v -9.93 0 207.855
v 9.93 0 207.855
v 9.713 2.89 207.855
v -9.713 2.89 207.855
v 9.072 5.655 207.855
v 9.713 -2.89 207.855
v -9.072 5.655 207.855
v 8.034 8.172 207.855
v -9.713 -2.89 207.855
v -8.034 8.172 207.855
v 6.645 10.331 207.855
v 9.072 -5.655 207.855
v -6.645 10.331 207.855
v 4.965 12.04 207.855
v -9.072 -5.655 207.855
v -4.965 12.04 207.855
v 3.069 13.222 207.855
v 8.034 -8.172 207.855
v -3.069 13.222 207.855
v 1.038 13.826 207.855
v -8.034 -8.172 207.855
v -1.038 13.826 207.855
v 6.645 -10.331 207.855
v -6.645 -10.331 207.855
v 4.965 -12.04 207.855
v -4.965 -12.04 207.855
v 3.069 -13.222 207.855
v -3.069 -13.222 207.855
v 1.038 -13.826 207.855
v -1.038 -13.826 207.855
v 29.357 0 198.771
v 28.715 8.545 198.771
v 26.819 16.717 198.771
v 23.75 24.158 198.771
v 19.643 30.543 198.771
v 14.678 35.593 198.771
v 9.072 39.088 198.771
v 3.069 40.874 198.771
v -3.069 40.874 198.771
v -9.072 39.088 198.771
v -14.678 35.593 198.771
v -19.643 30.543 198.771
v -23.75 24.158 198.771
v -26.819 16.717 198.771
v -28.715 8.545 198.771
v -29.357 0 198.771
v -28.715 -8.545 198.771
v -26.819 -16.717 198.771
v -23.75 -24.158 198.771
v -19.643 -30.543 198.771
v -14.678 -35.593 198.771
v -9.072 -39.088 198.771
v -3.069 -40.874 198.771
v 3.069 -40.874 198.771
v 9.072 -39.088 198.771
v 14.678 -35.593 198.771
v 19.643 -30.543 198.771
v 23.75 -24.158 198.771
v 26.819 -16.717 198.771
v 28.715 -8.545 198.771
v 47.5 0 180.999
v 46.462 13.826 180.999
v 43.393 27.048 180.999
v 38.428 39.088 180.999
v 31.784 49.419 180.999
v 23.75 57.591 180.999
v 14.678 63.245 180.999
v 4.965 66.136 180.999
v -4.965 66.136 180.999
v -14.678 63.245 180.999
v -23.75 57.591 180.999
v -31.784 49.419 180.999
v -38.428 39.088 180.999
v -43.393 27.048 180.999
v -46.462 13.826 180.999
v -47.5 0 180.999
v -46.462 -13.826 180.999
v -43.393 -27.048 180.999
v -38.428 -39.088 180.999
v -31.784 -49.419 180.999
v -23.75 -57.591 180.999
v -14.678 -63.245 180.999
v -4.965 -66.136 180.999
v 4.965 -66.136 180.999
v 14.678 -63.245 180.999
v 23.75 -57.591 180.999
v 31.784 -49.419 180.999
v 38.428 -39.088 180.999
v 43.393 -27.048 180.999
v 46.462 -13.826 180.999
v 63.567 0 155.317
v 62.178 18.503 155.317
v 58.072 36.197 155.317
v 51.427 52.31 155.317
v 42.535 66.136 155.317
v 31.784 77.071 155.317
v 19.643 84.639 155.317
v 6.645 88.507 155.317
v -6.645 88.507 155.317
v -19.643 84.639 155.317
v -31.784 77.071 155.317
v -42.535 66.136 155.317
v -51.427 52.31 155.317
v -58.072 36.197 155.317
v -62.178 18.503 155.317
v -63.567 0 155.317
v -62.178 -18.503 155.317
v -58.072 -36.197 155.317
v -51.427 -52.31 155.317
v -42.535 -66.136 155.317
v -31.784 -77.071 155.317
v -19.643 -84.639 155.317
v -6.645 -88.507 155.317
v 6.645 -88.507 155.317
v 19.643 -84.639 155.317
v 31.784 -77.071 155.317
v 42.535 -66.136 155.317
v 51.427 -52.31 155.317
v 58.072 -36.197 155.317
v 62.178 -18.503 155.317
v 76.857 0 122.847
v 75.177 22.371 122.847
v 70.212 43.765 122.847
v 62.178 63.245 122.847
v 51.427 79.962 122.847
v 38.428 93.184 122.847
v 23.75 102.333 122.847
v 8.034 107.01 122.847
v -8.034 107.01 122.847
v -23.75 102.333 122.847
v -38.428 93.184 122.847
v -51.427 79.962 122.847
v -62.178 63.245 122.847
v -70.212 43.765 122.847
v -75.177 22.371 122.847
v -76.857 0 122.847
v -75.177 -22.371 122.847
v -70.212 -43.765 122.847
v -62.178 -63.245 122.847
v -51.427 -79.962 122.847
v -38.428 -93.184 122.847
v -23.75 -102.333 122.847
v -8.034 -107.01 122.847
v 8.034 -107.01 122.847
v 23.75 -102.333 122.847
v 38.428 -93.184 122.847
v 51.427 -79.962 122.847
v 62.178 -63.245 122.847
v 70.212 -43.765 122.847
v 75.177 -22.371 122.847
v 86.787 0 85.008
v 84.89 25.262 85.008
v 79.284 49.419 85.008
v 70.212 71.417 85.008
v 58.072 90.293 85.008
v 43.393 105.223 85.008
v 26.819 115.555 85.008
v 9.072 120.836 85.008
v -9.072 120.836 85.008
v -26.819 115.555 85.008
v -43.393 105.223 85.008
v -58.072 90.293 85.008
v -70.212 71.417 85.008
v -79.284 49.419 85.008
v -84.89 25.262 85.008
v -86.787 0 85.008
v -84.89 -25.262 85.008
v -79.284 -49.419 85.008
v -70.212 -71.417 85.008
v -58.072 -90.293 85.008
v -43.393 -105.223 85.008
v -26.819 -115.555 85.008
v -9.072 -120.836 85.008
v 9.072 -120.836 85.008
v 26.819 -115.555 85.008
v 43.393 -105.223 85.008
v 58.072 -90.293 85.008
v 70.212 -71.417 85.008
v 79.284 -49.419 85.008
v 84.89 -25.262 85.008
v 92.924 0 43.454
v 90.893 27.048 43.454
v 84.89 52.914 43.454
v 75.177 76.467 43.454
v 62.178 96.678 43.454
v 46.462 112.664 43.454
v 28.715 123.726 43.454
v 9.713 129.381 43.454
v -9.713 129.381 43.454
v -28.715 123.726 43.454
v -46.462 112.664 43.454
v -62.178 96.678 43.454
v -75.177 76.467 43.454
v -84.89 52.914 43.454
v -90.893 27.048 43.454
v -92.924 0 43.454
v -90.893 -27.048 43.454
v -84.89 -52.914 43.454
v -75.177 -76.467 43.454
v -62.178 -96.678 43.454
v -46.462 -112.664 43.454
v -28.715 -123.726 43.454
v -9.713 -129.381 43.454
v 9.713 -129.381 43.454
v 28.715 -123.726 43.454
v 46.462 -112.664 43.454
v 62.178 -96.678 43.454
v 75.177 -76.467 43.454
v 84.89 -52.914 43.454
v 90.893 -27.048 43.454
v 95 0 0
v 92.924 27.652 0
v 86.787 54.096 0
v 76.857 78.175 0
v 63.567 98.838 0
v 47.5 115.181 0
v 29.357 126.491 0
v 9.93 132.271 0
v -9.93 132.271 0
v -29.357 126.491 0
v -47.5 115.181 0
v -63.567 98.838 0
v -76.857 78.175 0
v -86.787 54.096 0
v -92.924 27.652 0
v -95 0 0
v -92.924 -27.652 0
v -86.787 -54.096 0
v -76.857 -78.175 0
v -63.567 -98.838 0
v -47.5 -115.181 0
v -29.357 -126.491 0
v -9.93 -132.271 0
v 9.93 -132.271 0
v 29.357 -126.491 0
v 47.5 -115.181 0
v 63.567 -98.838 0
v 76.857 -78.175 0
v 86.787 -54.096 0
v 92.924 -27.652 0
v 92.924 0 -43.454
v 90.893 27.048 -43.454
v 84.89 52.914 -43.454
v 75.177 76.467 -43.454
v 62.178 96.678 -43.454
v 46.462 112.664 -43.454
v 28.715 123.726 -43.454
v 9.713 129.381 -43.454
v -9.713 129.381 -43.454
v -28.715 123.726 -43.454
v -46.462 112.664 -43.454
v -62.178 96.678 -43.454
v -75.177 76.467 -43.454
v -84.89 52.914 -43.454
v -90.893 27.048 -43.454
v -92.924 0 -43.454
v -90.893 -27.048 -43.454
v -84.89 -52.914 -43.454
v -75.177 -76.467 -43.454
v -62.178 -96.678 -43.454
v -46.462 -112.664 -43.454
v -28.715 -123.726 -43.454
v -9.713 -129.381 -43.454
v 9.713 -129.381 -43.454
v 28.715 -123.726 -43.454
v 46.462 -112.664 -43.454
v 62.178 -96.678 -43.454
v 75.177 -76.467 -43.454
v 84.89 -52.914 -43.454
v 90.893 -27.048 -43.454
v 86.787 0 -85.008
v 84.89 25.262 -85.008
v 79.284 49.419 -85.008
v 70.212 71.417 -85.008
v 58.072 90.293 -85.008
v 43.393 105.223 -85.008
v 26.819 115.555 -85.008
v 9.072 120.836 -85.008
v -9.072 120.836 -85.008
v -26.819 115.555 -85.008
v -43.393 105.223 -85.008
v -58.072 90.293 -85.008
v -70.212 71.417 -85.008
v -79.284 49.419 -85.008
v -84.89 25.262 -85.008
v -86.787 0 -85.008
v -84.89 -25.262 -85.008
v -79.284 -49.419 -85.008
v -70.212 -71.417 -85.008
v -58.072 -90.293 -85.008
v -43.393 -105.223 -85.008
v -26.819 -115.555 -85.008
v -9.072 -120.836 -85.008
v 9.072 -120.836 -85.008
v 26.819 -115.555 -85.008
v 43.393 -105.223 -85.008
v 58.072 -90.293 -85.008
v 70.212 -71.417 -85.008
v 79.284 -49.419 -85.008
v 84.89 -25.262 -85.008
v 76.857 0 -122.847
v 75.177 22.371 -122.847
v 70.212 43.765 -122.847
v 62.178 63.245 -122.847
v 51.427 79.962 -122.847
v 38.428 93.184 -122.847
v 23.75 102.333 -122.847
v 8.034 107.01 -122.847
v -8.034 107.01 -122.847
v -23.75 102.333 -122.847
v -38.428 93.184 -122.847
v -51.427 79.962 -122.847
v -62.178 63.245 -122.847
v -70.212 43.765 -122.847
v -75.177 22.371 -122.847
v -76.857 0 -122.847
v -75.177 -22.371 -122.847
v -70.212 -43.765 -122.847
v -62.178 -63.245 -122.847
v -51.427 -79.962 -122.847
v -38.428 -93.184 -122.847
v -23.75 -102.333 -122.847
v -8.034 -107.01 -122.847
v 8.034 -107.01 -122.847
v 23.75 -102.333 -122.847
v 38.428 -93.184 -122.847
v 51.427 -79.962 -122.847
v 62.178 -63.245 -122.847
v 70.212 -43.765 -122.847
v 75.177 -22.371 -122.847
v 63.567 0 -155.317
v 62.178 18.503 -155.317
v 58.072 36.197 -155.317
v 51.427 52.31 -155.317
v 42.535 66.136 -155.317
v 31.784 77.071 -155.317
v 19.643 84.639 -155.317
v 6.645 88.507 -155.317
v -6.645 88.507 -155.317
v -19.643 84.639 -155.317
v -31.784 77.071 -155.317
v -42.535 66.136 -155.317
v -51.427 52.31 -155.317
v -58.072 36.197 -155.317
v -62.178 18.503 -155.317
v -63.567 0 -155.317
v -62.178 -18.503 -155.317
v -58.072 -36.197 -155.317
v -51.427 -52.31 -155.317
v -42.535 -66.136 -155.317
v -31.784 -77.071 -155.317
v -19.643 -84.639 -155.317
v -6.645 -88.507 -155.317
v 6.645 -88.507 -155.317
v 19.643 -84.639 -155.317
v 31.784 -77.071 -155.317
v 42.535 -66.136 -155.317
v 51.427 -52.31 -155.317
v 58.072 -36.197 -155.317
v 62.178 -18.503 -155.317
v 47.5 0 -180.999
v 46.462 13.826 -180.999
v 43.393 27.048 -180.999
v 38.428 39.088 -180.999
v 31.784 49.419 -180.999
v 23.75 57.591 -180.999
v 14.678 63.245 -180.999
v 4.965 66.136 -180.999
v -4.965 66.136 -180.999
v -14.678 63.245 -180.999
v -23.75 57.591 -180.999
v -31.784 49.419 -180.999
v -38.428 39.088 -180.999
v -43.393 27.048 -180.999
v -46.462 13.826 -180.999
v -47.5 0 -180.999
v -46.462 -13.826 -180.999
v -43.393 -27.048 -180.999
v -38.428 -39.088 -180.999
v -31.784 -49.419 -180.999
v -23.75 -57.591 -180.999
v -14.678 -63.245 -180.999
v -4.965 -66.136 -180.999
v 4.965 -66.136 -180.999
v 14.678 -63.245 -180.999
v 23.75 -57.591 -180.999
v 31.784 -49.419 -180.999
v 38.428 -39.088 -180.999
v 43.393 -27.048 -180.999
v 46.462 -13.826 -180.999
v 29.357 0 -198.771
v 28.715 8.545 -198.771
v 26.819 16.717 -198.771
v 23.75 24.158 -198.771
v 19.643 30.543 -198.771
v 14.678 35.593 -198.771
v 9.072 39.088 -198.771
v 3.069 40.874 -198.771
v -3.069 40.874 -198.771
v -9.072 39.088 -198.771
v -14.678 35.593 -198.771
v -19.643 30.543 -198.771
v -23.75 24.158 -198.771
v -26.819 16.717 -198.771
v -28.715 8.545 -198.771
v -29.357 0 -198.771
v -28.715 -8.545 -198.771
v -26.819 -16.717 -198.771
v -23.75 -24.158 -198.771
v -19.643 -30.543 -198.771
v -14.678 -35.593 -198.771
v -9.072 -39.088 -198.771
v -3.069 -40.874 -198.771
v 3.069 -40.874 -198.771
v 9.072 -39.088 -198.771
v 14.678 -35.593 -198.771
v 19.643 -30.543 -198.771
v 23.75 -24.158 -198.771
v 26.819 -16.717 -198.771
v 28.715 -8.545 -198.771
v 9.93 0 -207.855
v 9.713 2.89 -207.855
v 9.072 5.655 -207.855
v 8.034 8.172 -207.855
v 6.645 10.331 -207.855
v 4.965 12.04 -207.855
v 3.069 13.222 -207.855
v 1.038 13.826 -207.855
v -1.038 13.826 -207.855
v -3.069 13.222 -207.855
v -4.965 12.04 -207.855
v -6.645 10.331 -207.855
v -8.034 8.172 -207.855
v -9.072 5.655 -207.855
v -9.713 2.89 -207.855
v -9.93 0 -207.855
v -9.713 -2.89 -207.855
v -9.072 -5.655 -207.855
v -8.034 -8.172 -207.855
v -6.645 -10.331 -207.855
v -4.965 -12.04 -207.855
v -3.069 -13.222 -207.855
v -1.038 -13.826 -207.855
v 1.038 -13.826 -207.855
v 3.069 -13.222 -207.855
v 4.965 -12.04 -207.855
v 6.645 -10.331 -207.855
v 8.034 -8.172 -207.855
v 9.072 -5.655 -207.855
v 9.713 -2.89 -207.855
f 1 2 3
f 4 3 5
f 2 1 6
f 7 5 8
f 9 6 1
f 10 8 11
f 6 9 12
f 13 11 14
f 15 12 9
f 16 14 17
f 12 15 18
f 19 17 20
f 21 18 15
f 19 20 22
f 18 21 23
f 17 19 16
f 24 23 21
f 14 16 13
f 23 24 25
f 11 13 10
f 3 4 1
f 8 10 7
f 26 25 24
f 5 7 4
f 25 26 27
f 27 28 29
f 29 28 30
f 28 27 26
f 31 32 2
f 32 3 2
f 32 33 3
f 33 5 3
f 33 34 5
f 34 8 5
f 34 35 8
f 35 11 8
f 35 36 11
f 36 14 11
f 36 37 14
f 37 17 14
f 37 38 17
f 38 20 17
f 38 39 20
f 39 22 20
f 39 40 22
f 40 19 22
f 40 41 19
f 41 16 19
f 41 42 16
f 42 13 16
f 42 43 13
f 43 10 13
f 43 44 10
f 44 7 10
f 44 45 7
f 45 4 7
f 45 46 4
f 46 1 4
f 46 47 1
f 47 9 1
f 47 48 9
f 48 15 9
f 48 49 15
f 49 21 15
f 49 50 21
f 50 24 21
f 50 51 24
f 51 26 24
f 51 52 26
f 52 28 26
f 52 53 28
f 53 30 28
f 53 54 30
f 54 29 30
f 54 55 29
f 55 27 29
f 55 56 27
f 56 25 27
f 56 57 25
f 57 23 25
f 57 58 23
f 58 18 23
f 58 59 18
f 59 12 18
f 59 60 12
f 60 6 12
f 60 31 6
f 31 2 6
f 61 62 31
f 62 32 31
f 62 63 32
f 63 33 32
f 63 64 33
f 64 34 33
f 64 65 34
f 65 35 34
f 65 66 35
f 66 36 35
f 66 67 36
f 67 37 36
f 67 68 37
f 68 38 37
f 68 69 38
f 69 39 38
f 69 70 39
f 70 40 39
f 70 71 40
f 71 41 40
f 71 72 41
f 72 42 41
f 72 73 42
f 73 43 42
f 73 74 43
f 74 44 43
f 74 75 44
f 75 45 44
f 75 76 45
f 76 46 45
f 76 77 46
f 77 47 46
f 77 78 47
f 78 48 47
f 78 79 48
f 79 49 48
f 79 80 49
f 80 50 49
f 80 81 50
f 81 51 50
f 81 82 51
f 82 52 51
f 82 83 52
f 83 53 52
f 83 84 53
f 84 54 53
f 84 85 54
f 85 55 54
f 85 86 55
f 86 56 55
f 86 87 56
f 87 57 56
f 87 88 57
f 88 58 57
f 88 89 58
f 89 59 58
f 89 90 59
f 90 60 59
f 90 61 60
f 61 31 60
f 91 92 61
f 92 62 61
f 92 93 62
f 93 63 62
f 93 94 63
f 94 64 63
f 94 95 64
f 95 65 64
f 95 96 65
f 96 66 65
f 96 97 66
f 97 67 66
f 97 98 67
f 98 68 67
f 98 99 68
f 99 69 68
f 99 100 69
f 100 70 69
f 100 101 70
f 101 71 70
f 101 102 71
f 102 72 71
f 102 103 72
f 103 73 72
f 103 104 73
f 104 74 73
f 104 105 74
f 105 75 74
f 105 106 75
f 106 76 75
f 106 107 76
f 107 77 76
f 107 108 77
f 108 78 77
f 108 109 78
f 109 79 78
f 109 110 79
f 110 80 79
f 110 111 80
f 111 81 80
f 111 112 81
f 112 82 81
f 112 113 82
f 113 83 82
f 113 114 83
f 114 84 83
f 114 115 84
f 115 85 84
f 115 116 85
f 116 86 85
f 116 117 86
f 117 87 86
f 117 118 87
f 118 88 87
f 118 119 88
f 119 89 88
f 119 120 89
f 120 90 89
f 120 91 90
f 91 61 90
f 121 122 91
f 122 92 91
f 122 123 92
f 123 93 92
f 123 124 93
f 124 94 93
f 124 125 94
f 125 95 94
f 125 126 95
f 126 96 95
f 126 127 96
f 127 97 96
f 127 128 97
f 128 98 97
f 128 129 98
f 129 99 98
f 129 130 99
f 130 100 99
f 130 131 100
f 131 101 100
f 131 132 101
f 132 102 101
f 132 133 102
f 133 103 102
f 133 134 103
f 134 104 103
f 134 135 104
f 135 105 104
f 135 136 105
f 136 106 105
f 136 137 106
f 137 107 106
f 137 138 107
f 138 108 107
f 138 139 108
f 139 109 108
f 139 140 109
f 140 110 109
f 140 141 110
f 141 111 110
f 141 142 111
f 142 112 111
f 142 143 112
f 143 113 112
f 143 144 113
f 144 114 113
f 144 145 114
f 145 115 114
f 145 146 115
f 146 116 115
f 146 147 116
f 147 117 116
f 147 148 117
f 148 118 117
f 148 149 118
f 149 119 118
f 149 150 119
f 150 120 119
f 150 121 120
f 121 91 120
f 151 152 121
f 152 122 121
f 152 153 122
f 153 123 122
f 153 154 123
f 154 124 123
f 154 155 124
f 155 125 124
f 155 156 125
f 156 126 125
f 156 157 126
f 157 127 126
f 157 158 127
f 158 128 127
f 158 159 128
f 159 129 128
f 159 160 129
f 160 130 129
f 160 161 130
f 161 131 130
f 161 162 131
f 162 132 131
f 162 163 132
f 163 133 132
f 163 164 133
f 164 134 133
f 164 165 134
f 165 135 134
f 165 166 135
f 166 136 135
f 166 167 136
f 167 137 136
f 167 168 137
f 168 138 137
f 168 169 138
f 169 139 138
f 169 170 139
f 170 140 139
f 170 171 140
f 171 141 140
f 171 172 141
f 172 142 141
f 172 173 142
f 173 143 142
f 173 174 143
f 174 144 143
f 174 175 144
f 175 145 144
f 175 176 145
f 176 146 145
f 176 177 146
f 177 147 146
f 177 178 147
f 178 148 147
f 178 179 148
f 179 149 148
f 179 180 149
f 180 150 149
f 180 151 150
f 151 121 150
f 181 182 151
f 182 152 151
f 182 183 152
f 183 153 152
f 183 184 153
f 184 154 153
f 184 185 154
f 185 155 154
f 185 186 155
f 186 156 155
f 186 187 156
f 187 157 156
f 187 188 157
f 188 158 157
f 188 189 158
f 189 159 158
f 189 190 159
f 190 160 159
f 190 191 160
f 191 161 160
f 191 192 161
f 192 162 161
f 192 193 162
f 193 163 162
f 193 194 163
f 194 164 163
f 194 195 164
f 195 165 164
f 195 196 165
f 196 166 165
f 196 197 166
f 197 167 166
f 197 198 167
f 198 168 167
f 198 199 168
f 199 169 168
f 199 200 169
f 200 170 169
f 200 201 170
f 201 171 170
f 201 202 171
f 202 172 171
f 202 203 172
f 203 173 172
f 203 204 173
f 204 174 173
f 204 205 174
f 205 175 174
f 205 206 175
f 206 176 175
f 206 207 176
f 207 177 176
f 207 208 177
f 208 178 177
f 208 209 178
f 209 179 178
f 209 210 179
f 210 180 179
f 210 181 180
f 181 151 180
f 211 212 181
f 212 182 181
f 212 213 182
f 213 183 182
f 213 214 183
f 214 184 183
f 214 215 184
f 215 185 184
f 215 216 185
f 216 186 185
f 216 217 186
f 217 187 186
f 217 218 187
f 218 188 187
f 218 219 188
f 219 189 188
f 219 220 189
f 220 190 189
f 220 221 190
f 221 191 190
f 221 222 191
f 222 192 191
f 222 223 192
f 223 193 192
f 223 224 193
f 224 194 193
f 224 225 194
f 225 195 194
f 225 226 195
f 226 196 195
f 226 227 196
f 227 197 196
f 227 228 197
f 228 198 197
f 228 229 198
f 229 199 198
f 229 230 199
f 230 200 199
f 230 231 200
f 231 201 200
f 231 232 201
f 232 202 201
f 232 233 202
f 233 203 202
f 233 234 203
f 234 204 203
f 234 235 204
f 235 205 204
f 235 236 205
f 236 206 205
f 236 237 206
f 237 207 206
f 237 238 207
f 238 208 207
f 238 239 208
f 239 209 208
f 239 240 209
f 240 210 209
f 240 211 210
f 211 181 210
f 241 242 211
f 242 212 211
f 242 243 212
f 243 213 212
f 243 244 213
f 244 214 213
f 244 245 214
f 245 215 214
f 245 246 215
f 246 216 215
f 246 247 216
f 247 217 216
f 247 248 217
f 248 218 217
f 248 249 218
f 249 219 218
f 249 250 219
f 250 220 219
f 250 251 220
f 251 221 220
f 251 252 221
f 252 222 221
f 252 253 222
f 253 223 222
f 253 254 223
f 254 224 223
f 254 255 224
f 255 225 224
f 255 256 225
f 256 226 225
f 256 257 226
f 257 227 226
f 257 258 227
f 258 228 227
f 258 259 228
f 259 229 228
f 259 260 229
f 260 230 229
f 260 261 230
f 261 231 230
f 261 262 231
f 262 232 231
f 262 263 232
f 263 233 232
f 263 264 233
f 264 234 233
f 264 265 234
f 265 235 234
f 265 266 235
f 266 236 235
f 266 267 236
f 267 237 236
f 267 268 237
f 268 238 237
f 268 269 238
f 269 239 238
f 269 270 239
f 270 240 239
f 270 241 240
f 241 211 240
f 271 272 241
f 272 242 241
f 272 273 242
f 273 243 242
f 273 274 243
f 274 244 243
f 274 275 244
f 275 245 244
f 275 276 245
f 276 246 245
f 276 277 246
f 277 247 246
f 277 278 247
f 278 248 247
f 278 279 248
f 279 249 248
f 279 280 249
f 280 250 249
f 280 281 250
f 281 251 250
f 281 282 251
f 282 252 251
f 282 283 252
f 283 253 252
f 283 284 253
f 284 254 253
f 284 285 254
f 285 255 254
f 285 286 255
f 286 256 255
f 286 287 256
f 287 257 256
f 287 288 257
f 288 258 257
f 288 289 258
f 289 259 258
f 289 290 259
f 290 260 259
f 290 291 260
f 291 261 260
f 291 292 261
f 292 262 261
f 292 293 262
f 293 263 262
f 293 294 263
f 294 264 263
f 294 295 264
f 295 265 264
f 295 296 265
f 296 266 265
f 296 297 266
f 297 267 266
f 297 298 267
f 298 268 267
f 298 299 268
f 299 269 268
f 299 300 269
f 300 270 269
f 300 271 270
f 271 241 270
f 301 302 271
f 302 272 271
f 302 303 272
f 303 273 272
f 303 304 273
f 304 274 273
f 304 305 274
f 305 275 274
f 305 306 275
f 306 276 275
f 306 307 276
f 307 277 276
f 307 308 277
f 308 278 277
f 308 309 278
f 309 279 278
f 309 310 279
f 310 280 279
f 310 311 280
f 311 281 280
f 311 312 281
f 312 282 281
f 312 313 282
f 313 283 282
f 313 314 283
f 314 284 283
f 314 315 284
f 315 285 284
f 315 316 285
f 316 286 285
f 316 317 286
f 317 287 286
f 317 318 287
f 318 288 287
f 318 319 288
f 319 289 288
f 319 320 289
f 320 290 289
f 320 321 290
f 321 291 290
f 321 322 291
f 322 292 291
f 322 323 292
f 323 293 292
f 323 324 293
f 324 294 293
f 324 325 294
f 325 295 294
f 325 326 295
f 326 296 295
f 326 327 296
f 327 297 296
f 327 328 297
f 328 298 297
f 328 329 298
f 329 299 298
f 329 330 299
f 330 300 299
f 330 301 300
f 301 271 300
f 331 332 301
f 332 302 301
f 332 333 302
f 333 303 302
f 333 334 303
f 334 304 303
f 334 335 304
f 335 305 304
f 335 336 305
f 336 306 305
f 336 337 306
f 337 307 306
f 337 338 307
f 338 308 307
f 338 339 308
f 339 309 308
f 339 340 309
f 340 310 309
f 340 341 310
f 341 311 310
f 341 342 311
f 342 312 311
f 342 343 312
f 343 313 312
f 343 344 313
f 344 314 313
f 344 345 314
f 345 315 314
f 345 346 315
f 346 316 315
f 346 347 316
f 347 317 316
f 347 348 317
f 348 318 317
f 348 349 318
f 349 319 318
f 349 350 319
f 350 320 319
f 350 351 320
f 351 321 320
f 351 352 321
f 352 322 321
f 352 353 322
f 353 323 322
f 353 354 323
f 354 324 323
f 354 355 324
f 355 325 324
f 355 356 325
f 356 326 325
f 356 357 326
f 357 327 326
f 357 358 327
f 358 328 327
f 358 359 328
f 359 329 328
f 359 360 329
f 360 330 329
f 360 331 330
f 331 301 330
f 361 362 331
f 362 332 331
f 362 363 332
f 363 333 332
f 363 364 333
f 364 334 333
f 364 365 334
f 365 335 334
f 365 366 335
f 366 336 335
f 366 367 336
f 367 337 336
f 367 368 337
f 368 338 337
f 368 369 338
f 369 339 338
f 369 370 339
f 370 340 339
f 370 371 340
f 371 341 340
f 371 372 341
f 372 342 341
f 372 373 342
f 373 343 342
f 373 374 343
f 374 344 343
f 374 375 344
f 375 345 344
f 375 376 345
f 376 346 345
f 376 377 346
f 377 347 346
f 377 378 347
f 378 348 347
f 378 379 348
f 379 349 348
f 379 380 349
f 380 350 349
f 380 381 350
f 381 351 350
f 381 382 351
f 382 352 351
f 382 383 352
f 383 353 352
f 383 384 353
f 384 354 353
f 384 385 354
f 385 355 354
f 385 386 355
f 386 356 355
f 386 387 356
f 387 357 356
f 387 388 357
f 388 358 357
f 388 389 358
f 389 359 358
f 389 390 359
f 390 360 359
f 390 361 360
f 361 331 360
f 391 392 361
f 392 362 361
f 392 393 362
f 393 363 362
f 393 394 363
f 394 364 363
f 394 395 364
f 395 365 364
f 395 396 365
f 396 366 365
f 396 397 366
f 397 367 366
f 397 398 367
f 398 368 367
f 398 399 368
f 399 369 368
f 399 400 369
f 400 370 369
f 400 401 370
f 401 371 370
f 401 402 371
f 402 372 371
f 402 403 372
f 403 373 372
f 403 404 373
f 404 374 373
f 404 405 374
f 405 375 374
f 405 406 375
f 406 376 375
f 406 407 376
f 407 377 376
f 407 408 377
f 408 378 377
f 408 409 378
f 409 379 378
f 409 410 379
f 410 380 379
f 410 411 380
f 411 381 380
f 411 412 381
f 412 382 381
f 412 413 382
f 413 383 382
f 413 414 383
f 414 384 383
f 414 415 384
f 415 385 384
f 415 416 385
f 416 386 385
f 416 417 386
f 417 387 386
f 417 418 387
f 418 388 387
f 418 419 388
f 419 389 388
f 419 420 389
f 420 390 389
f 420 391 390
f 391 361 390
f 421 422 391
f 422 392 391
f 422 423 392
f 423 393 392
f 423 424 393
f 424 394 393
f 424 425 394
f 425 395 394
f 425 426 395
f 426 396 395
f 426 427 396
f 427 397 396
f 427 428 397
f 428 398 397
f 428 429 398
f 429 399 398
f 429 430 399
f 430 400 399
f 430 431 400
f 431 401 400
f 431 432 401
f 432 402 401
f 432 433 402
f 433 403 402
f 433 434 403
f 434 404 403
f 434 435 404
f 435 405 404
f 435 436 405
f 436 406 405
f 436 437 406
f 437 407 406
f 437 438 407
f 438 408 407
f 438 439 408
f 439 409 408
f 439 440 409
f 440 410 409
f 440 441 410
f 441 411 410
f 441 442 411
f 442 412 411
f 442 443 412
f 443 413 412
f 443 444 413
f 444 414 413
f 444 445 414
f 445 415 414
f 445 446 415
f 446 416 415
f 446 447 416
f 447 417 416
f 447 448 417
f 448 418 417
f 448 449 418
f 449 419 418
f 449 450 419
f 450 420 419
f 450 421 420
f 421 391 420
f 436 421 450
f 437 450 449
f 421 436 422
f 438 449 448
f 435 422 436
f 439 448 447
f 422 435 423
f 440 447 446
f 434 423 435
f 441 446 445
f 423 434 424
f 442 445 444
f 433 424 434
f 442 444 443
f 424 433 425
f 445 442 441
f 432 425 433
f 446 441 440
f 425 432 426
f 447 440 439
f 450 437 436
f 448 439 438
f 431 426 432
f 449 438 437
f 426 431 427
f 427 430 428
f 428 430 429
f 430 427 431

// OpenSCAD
// Generated by SolidPython 1.0.1 on 2020-07-29 00:46:46


scale(v = [5, 7, 11]) {
	sphere(r = 19);
}
/***********************************************
*********      SolidPython code:      **********
************************************************
 
# import packages: SolidPython
from solid import *
from solid.utils import *
from itertools import chain, combinations, permutations


class Resize:

    def __init__(self, scad_file):
        self.scad_file = scad_file
        #self.scad_file = import_scad(scad_file)
        # cone/cylinder param:
        self.r1 = 0
        self.r2 = 0
        self.h = 0
        # rectangular prism param:
        self.w = 0
        self.l = 0
        # ellipse param:
        self.r = 0

    # import OpenScad code (file name corresponds to shape)


    # classify shape + parameters
    def assign(self, param1, param2, param3):
        if self.scad_file == 'cone.scad':
            self.r1 = param1
            self.r2 = param2
            self.h = param3
        elif self.scad_file == 'cylinder.scad':
            self.r1 = param1
            self.r2 = param2
            self.h = param3
        elif self.scad_file == 'rectangularPrism.scad':
            self.h = param1
            self.l = param2
            self.w = param3
        else:
            self.r = param1
            self.h = param2

    # resize parameters
    def iterate(self):
        x = range(3, 20, 2)
        i = 1
        if self.scad_file == 'cone.scad':
            tempList = list(permutations(x, 2))
            for temp in tempList:
                param1 = temp[0]
                param2 = temp[1]
                filepath = 'produced_scad_files/' + 'cone' + str(param1) + '_' + str(param2) + '_' + '.scad'
                scad_render_to_file(cylinder(h=param1, r1=param2, r2=0), filepath)

        elif self.scad_file == 'cylinder.scad':
            tempList = list(permutations(x, 3))
            for temp in tempList:
                param1 = temp[0]
                param2 = temp[1]
                filepath = 'produced_scad_files/' + 'cylinder' + str(param1) + '_' + str(param2) + '_' + '.scad'
                scad_render_to_file(cylinder(h=param1, r1=param2, r2=param2), filepath)

        elif self.scad_file == 'rectangularPrism.scad':
            tempList = list(permutations(x, 3))
            for temp in tempList:
                param1 = temp[0]
                param2 = temp[1]
                param3 = temp[2]
                filepath = 'produced_scad_files/' + 'rectangularPrism' + str(param1) + '_' + str(param2) + '_' + str(
                    param3) + '.scad'
                scad_render_to_file(cube(size=(param1, param2, param3)), filepath)

        elif self.scad_file == 'ellipse.scad':
            tempList = list(permutations(x, 4))
            for temp in tempList:
                param1 = temp[0]
                param2 = temp[1]
                param3 = temp[2]
                param4 = temp[3]
                filepath = 'produced_scad_files/' + 'ellipse' + str(param1) + '_' + str(param2) + '_' + str(param3) + '_' + str(param4) + '.scad'
                scad_render_to_file(scale([param1, param2, param3])(sphere(r=param4)), filepath)

    def render_to_scadfile(self):
        scad_render_to_file(scad, 'example.scad') 
 
************************************************/
